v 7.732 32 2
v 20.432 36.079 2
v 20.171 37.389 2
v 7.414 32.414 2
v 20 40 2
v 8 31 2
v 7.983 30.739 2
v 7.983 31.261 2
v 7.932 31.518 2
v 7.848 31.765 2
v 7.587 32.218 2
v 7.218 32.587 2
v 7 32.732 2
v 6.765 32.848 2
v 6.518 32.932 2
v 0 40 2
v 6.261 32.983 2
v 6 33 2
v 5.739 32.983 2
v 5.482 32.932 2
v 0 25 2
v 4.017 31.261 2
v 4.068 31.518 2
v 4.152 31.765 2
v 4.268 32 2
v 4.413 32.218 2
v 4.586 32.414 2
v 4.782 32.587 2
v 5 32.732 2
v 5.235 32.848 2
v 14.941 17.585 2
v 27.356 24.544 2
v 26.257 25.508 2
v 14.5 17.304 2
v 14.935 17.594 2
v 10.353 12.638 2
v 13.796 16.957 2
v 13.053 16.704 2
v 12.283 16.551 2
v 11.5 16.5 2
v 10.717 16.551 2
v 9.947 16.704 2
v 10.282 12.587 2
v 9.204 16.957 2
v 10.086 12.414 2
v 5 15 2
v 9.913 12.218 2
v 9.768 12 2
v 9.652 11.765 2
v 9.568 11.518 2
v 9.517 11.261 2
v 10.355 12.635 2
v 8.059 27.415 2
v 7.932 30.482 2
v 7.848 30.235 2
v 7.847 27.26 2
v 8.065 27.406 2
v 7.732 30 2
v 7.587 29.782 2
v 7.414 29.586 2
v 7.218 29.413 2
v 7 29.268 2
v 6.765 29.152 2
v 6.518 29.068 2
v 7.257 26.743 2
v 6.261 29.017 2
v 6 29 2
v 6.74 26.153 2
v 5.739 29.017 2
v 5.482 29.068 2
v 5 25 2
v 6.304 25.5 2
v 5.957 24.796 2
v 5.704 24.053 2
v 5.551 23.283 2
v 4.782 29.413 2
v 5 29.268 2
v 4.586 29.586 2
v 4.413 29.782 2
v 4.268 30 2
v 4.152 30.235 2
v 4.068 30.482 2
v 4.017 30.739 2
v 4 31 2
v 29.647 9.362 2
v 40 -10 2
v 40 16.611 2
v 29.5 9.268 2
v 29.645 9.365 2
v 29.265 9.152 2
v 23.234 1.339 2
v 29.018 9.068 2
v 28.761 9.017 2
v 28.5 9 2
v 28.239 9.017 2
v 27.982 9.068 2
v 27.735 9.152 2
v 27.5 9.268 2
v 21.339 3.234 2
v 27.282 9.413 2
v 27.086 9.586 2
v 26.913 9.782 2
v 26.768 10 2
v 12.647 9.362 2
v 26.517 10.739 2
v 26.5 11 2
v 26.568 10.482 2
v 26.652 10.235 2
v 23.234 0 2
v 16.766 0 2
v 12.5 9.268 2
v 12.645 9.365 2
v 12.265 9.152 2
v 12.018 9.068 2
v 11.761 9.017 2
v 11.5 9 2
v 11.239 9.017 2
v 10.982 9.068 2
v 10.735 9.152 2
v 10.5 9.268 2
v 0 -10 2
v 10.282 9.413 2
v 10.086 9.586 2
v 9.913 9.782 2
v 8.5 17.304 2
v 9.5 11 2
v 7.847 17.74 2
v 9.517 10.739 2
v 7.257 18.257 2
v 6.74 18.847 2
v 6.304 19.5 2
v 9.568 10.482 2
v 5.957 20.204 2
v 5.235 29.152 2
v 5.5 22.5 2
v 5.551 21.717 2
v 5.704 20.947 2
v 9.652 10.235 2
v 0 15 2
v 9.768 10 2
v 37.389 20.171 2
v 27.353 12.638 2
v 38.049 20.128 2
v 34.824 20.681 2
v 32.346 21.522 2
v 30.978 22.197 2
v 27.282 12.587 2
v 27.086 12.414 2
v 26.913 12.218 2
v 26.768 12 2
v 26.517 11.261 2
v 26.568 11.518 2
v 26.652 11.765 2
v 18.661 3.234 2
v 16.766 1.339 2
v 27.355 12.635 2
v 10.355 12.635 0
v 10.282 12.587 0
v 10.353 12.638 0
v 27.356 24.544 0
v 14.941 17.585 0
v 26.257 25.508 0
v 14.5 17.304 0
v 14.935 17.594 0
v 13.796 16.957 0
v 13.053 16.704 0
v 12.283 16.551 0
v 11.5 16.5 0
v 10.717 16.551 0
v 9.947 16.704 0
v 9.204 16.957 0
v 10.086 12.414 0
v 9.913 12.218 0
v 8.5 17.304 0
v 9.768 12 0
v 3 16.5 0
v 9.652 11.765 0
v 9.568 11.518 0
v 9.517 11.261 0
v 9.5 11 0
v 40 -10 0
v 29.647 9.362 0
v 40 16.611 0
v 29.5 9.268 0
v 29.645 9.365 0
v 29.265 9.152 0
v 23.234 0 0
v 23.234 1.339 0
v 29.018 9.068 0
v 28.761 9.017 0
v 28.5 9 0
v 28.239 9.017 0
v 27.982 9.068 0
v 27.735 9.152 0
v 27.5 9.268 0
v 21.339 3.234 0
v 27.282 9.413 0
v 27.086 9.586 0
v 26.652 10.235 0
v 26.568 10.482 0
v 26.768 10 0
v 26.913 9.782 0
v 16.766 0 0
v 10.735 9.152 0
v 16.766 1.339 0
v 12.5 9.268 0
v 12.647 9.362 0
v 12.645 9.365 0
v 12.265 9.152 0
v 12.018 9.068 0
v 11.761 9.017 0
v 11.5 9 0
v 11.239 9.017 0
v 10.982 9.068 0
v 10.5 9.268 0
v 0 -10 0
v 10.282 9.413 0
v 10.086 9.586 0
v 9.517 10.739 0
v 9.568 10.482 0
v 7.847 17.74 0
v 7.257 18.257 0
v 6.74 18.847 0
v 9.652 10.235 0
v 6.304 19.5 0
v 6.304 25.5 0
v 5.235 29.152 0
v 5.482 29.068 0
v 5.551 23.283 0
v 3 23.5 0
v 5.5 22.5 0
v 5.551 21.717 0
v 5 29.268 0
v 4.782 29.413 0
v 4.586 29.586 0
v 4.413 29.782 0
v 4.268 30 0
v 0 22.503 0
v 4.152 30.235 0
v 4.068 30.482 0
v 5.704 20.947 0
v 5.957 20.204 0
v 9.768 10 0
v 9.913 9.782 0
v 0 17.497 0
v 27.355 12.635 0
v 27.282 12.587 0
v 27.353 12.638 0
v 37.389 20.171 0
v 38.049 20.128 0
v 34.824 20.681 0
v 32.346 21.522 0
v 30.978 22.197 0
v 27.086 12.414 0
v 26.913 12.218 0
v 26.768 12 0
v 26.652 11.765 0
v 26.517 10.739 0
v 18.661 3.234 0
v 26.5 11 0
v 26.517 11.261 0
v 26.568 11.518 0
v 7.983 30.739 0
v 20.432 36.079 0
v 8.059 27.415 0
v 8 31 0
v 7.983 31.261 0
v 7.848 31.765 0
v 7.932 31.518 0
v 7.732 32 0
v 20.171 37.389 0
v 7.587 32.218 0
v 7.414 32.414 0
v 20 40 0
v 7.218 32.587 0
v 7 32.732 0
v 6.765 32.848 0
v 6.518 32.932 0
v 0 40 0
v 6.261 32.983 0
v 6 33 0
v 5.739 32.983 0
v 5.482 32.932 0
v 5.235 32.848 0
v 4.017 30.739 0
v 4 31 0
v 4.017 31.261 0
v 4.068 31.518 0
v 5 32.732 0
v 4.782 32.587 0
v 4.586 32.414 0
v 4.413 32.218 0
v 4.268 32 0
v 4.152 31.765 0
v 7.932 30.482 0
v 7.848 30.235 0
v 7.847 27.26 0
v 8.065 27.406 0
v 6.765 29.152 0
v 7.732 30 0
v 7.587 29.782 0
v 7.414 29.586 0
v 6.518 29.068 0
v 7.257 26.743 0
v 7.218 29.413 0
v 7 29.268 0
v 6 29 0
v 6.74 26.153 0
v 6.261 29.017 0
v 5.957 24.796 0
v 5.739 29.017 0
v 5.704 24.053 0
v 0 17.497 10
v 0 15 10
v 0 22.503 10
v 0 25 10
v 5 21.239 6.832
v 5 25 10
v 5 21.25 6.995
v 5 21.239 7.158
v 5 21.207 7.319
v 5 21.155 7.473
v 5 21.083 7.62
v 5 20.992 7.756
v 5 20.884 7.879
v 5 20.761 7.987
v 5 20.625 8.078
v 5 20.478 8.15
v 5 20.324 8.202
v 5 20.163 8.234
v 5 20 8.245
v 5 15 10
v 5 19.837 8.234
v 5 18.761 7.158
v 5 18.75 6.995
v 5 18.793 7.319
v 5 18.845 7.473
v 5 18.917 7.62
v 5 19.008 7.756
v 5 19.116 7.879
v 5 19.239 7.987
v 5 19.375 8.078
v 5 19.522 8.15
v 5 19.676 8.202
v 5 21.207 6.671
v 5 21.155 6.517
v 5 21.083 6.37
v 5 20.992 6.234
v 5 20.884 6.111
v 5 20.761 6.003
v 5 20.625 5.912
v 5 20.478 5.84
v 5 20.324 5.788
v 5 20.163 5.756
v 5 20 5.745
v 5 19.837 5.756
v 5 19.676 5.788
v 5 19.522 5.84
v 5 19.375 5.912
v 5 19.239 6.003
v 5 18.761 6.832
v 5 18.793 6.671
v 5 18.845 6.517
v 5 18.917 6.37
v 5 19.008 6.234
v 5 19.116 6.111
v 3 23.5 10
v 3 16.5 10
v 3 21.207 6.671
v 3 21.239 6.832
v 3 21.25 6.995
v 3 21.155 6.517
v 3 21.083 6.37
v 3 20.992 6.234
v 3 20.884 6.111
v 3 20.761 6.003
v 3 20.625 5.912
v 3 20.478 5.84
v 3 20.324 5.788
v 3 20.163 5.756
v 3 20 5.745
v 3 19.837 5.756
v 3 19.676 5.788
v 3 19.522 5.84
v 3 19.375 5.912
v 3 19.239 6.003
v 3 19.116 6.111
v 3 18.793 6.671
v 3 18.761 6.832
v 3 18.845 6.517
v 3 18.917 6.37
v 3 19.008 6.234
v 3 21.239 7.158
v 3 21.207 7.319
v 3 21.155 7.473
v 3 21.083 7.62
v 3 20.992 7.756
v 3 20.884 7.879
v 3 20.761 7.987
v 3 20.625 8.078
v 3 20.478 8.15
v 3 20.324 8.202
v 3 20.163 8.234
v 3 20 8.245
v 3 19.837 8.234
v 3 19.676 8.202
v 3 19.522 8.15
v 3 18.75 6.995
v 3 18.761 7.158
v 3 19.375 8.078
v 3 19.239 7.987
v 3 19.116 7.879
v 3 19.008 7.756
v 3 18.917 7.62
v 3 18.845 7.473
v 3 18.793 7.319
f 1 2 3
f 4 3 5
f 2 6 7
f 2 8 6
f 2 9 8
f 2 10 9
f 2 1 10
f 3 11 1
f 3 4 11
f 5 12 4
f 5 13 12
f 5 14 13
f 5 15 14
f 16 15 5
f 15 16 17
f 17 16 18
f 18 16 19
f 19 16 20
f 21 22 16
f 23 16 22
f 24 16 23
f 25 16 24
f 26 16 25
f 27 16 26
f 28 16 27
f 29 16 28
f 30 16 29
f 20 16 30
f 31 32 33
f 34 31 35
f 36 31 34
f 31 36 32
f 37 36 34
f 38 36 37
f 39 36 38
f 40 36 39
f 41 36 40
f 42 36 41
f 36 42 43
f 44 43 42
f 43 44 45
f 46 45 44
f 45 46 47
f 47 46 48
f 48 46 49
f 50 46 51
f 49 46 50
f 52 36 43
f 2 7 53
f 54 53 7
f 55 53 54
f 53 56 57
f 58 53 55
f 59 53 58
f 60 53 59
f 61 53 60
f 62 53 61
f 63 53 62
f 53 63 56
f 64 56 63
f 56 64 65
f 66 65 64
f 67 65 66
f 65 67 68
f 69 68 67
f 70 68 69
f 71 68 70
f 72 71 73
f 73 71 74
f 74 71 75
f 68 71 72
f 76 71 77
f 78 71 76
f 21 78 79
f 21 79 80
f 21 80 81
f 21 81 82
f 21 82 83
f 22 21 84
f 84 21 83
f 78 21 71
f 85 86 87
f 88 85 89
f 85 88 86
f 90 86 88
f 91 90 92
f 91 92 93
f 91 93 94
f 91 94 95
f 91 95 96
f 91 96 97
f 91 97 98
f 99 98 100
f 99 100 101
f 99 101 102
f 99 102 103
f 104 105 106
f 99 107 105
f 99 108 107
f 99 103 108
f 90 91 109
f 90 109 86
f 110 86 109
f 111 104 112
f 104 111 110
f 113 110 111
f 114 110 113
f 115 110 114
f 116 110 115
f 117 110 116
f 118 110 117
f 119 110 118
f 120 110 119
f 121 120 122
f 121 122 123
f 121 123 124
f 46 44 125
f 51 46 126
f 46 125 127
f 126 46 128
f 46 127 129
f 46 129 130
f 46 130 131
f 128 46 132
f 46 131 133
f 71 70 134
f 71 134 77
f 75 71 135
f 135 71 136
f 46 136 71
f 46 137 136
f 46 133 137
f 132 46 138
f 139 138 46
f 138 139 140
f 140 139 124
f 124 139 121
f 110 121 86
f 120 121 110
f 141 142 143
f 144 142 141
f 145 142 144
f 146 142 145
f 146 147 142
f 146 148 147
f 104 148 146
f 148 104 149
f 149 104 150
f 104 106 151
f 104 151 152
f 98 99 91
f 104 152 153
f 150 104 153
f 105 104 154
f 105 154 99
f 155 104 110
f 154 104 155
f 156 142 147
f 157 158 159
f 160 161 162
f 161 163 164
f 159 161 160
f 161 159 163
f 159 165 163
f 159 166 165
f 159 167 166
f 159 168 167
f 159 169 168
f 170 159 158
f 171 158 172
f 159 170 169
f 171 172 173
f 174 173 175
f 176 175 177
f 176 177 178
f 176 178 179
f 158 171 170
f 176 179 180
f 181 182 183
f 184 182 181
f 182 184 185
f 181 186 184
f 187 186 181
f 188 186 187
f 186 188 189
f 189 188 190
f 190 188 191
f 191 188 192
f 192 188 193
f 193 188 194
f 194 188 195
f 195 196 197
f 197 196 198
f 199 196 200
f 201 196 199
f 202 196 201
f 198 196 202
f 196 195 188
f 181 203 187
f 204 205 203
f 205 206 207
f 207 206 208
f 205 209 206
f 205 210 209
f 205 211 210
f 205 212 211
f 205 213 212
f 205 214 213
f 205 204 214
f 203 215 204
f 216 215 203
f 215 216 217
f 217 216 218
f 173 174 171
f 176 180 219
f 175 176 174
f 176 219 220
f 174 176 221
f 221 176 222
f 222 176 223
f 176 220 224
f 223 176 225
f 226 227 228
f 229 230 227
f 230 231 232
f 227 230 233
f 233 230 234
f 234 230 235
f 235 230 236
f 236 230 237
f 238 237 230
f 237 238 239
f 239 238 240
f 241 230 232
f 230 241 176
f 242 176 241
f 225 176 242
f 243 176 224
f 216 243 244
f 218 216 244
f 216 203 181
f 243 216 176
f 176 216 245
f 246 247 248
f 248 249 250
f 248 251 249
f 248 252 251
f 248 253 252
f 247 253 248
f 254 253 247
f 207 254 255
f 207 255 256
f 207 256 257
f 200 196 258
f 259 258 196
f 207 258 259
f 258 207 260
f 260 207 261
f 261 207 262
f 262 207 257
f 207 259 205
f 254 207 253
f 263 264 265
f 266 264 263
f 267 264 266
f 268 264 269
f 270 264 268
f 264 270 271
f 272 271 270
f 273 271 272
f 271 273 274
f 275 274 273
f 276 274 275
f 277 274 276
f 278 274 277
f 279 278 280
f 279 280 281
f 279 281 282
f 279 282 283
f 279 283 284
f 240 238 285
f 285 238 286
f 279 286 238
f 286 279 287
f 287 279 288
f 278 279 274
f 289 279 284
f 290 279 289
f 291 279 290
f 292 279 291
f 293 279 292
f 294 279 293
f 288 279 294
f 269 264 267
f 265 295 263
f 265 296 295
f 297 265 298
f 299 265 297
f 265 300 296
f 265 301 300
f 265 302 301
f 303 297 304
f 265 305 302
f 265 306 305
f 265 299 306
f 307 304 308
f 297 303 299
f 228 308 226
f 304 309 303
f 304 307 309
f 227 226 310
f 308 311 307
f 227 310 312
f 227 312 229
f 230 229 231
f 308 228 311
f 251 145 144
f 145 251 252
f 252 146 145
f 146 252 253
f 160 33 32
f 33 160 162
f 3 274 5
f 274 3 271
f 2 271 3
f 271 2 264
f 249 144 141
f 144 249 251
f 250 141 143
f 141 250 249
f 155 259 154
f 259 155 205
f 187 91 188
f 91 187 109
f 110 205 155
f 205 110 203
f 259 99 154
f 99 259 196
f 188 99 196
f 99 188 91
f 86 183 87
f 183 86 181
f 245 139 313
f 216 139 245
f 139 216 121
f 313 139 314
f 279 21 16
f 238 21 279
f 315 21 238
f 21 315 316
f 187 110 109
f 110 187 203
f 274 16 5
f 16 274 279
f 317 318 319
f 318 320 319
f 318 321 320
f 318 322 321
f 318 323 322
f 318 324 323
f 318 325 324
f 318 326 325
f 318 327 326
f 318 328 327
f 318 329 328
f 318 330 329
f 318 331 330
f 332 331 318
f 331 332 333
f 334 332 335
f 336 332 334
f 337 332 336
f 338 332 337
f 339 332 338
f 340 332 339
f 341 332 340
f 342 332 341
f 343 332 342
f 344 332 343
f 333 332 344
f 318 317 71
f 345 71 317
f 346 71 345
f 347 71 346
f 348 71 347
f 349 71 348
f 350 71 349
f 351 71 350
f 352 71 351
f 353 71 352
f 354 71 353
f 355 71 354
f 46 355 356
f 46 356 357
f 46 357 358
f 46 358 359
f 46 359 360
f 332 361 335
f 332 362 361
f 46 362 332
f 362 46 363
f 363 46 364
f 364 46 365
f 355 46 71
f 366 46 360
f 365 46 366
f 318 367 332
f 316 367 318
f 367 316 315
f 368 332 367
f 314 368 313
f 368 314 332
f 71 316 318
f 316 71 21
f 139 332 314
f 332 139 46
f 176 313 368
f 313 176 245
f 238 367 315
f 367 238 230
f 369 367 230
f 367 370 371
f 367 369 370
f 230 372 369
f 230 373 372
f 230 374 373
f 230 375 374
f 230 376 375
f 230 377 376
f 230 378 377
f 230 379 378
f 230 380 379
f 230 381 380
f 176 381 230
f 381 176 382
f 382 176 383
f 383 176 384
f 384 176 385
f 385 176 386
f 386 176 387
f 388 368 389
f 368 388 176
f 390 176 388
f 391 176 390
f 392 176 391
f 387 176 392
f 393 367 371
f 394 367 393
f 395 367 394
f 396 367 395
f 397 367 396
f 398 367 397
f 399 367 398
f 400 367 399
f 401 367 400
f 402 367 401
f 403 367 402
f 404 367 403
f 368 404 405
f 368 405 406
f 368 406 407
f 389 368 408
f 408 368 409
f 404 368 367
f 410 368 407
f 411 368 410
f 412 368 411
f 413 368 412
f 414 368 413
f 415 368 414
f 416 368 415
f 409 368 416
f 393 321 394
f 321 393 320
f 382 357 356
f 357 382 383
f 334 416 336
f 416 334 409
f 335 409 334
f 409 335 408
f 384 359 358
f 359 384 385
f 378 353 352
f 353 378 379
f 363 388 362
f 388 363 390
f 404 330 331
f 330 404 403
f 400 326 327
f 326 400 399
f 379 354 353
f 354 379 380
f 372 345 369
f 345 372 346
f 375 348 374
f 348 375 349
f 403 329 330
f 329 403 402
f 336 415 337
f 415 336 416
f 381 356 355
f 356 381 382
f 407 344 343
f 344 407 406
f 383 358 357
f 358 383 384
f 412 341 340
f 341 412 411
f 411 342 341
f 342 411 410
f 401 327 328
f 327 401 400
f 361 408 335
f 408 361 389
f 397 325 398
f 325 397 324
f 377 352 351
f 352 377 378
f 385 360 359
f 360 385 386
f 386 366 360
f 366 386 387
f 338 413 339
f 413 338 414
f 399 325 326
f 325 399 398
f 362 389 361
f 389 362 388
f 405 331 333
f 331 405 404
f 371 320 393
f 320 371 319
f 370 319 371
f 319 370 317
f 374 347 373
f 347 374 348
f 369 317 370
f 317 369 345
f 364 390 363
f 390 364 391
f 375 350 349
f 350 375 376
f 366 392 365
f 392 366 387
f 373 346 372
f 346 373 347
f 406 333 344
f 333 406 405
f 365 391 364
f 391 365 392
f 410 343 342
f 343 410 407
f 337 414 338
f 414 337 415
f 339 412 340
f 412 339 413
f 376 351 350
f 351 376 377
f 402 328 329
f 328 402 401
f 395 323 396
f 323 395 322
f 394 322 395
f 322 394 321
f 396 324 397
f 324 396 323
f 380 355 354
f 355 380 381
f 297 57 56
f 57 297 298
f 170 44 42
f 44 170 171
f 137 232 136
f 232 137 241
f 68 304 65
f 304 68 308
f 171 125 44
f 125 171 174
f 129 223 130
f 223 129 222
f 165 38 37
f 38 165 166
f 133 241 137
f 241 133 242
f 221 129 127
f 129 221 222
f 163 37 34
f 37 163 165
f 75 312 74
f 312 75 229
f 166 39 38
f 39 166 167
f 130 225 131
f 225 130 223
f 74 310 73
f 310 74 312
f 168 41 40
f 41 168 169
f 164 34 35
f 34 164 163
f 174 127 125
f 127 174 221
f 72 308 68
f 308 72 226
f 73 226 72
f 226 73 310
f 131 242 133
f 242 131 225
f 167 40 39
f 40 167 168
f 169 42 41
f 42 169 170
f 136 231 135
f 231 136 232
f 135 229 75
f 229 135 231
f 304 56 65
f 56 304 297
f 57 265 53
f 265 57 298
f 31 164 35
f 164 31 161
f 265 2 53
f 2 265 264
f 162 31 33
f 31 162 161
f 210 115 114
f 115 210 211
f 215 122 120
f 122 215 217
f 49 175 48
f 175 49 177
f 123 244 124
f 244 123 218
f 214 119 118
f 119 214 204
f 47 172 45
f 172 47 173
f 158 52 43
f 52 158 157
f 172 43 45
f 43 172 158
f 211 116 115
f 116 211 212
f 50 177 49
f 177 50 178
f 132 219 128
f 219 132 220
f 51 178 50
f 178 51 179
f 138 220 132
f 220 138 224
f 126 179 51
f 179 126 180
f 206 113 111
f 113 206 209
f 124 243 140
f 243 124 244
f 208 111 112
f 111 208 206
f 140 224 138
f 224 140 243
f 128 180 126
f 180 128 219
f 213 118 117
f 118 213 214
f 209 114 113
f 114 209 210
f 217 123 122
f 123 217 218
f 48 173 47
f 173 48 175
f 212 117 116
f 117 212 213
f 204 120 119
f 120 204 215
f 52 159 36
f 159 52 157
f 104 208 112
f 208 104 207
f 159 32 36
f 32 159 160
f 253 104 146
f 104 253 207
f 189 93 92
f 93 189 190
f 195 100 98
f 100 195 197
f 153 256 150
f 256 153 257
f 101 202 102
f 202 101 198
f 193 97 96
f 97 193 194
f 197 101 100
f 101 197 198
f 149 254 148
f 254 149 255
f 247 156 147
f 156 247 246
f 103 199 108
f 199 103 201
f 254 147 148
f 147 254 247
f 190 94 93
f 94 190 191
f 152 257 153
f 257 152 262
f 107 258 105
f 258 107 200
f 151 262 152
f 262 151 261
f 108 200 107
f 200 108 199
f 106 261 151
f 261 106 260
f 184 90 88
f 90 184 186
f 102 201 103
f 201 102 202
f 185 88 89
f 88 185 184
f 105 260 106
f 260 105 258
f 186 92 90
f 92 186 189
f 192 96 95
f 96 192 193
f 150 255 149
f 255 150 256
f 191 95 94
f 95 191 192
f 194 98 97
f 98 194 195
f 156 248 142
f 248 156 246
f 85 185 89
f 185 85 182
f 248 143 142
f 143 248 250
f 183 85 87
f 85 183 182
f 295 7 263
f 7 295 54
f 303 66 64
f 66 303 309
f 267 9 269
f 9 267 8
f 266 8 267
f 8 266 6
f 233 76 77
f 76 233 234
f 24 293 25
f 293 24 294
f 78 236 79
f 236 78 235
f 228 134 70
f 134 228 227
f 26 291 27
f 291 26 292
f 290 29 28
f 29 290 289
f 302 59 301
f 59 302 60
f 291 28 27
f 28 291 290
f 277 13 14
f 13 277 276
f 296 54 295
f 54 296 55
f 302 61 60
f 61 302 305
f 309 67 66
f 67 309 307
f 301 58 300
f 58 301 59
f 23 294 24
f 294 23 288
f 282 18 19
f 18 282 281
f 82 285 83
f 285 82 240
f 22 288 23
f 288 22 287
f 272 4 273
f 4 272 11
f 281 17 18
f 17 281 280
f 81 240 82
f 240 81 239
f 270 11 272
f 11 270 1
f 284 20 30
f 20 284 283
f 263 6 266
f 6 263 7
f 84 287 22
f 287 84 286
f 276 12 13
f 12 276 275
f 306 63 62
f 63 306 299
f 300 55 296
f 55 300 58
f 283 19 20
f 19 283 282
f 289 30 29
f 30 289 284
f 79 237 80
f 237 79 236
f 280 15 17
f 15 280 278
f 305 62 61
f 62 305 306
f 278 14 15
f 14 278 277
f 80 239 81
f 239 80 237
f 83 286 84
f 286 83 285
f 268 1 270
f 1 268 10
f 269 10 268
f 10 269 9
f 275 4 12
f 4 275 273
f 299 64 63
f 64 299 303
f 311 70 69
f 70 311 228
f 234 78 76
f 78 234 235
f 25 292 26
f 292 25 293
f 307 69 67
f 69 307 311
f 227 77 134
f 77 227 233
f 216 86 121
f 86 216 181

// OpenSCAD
// upgrade connectors for 3d printer Flyingbear
// @author Ilya Protasov

/* TODO
*/

/* [Base] */
base_plate = true;
joint_test = true;

base_height = 2;
base_armx_length = 40;
base_army_length = 40;

base_armx_width = 20;
base_army_width = 20;

vconector_thick = 4;
/* [Hidden]  */
base_inner_corner_radius = 20;
$fn = 48;

module cornerPlate() {
    difference() {
        translate([base_army_width, base_armx_width])
            cube([base_inner_corner_radius, base_inner_corner_radius, base_height], false);
        translate([base_army_width + base_inner_corner_radius, base_armx_width + base_inner_corner_radius,
        base_height/2]) 
            cylinder(h=base_height*2, d1=base_inner_corner_radius*2, d2=base_inner_corner_radius*2, center = true);
    }
    //armx
    cube([base_armx_length, base_armx_width, base_height], false);
    //army
    cube([base_army_width, base_army_length, base_height], false);
    
    // joiners    octo circle
    translate([20, 0, -0.005]) lockJoiner(
        type = "octo",
        isNotch = true, h=10, 
        maxLen = 7,
        minLen = 5,
        depth = 3);
    
    // axis X
    //translate([20-5, 0]) cube([10, 5, 10]);
    
    // axis Y
    translate([0, 20-5]) cube([5, 10, 10]);
}

module basePlate() {
    difference() {
        cornerPlate();
        // big
        translate([11.5, 22.5, base_height/2])
            cylinder(h=base_height*2, d1=12, d2=12, center = true);
        // open circle hole
        translate([11.5, 22.5, -base_height/2]) rotate([0,0,35]) 
            branch(20, 12, base_height*2);
        // === left bottom
        translate([11.5, 11, base_height/2])
            cylinder(h=base_height*2, d1=4, d2=4, center = true);
        // open circle hole
        translate([11.5, 11, -base_height/2]) rotate([0,0,35]) 
            branch(30, 4, base_height*2);
        // bottom right
        translate([28.5, 11, base_height/2])
            cylinder(h=base_height*2, d1=4, d2=4, center = true);
        // open circle hole
        translate([28.5, 11, -base_height/2]) rotate([0,0,35]) 
            branch(30, 4, base_height*2);
        translate([6, 31, base_height/2])
            cylinder(h=base_height*2, d1=4, d2=4, center = true);
                        
        // joiners    octo circle
        translate([20, 0, -0.005]) lockJoiner(
            type = "octo",
            isNotch = true, h=10, 
            maxLen = 7,
            minLen = 5,
            depth = 3);
        translate([0, 20, -0.005]) rotate([0,0,-90]) lockJoiner(
            type = "notch",
            isNotch = true, h=10, 
            maxLen = 7,
            minLen = 5,
            depth = 3);     
    }
}

module branch(len, width, height) {
    translate([0, -width/2, 0])
            cube([len, width, height], false);
}

function pointsNotch(isNotch, maxLen, minLen, gap, depth, depthGap) = [
        [-minLen/2 + (isNotch ? 0 : gap), -0.01], 
        [-maxLen/2 + (isNotch ? 0 : gap), depth - (isNotch ? 0 : depthGap)], 
        [maxLen/2 - (isNotch ? 0 : gap), depth - (isNotch ? 0 : depthGap)],
        [minLen/2 - (isNotch ? 0 : gap), -0.01]
    ];

function pointsCross(isNotch, maxLen, minLen, gap, depth, depthGap) = [
        [-minLen/2 + (isNotch ? 0 : gap), 0],
        [-minLen/2 + (isNotch ? 0 : gap), (maxLen-minLen)/2],
        [-maxLen/2 + (isNotch ? 0 : gap), (maxLen-minLen)/2],
        [-maxLen/2 + (isNotch ? 0 : gap), maxLen - (maxLen - minLen)/2],
        [-minLen/2 + (isNotch ? 0 : gap), maxLen - (maxLen - minLen)/2],
        [-minLen/2 + (isNotch ? 0 : gap), maxLen],
        
        [minLen/2 + (isNotch ? 0 : gap), maxLen],
        [minLen/2 + (isNotch ? 0 : gap), maxLen - (maxLen - minLen)/2],
        
        [maxLen/2 + (isNotch ? 0 : gap), maxLen - (maxLen - minLen)/2],
        [maxLen/2 + (isNotch ? 0 : gap), (maxLen-minLen)/2],
        
        [minLen/2 + (isNotch ? 0 : gap), (maxLen-minLen)/2],    
        [minLen/2 + (isNotch ? 0 : gap), 0]
    ];

module lockJoiner(type, isNotch, h, maxLen, minLen, depth) {
    gap = 0.2;
    depthGap = 0.1;

    pointsNotch = pointsNotch(isNotch, maxLen, minLen, gap, depth, depthGap); 
    
    pointsCross = pointsCross(isNotch, maxLen, minLen, gap, depth, depthGap);
    
    pointsOcto = [
        [-minLen/2 + (isNotch ? 0 : gap), 0],
        [-maxLen/2 + (isNotch ? 0 : gap), (maxLen-minLen)/2],
        [-maxLen/2 + (isNotch ? 0 : gap), maxLen - (maxLen - minLen)/2],
        [-minLen/2 + (isNotch ? 0 : gap), maxLen],
        [minLen/2 + (isNotch ? 0 : gap), maxLen],
        [maxLen/2 + (isNotch ? 0 : gap), maxLen - (maxLen - minLen)/2],
        [maxLen/2 + (isNotch ? 0 : gap), (maxLen-minLen)/2],   
        [minLen/2 + (isNotch ? 0 : gap), 0]
    ];
    // TODO offset(r=1) - фигура с отступом
    color(isNotch ? "Magenta" : "Red") 
        linear_extrude(h + (isNotch ? 0.01 : 0))
            if (type == "notch")
                polygon(pointsNotch);
            else if (type == "facetsSquare")
                //offset(delta=(maxLen-minLen)/2, chamfer = true)
                //square(minLen);
                polygon(pointsOcto);
            else if (type == "cross")
                polygon(pointsCross);
            else if (type == "circle")
                circle(r = maxLen/2);
            else if (type == "octo")
                rotate([0, 0, 45/2])
                    circle(r = maxLen/2, $fn = 8);
    if (isNotch)
        translate([0, 4, 7])
            rotate([90, 0, 0])
                cylinder(h=10, d1=2.5, d2=2.5, center = true);     
}

module testJoiner() {
    translate([20, 0])  lockJoiner(isNotch = false, h=base_height, 
               outer_length = 7,
               neck_length = 5,
               depth = 3);
    translate([0, -10]) cube([40, 10, base_height], false);
}

if (base_plate) basePlate();
if (joint_test) testJoiner();
